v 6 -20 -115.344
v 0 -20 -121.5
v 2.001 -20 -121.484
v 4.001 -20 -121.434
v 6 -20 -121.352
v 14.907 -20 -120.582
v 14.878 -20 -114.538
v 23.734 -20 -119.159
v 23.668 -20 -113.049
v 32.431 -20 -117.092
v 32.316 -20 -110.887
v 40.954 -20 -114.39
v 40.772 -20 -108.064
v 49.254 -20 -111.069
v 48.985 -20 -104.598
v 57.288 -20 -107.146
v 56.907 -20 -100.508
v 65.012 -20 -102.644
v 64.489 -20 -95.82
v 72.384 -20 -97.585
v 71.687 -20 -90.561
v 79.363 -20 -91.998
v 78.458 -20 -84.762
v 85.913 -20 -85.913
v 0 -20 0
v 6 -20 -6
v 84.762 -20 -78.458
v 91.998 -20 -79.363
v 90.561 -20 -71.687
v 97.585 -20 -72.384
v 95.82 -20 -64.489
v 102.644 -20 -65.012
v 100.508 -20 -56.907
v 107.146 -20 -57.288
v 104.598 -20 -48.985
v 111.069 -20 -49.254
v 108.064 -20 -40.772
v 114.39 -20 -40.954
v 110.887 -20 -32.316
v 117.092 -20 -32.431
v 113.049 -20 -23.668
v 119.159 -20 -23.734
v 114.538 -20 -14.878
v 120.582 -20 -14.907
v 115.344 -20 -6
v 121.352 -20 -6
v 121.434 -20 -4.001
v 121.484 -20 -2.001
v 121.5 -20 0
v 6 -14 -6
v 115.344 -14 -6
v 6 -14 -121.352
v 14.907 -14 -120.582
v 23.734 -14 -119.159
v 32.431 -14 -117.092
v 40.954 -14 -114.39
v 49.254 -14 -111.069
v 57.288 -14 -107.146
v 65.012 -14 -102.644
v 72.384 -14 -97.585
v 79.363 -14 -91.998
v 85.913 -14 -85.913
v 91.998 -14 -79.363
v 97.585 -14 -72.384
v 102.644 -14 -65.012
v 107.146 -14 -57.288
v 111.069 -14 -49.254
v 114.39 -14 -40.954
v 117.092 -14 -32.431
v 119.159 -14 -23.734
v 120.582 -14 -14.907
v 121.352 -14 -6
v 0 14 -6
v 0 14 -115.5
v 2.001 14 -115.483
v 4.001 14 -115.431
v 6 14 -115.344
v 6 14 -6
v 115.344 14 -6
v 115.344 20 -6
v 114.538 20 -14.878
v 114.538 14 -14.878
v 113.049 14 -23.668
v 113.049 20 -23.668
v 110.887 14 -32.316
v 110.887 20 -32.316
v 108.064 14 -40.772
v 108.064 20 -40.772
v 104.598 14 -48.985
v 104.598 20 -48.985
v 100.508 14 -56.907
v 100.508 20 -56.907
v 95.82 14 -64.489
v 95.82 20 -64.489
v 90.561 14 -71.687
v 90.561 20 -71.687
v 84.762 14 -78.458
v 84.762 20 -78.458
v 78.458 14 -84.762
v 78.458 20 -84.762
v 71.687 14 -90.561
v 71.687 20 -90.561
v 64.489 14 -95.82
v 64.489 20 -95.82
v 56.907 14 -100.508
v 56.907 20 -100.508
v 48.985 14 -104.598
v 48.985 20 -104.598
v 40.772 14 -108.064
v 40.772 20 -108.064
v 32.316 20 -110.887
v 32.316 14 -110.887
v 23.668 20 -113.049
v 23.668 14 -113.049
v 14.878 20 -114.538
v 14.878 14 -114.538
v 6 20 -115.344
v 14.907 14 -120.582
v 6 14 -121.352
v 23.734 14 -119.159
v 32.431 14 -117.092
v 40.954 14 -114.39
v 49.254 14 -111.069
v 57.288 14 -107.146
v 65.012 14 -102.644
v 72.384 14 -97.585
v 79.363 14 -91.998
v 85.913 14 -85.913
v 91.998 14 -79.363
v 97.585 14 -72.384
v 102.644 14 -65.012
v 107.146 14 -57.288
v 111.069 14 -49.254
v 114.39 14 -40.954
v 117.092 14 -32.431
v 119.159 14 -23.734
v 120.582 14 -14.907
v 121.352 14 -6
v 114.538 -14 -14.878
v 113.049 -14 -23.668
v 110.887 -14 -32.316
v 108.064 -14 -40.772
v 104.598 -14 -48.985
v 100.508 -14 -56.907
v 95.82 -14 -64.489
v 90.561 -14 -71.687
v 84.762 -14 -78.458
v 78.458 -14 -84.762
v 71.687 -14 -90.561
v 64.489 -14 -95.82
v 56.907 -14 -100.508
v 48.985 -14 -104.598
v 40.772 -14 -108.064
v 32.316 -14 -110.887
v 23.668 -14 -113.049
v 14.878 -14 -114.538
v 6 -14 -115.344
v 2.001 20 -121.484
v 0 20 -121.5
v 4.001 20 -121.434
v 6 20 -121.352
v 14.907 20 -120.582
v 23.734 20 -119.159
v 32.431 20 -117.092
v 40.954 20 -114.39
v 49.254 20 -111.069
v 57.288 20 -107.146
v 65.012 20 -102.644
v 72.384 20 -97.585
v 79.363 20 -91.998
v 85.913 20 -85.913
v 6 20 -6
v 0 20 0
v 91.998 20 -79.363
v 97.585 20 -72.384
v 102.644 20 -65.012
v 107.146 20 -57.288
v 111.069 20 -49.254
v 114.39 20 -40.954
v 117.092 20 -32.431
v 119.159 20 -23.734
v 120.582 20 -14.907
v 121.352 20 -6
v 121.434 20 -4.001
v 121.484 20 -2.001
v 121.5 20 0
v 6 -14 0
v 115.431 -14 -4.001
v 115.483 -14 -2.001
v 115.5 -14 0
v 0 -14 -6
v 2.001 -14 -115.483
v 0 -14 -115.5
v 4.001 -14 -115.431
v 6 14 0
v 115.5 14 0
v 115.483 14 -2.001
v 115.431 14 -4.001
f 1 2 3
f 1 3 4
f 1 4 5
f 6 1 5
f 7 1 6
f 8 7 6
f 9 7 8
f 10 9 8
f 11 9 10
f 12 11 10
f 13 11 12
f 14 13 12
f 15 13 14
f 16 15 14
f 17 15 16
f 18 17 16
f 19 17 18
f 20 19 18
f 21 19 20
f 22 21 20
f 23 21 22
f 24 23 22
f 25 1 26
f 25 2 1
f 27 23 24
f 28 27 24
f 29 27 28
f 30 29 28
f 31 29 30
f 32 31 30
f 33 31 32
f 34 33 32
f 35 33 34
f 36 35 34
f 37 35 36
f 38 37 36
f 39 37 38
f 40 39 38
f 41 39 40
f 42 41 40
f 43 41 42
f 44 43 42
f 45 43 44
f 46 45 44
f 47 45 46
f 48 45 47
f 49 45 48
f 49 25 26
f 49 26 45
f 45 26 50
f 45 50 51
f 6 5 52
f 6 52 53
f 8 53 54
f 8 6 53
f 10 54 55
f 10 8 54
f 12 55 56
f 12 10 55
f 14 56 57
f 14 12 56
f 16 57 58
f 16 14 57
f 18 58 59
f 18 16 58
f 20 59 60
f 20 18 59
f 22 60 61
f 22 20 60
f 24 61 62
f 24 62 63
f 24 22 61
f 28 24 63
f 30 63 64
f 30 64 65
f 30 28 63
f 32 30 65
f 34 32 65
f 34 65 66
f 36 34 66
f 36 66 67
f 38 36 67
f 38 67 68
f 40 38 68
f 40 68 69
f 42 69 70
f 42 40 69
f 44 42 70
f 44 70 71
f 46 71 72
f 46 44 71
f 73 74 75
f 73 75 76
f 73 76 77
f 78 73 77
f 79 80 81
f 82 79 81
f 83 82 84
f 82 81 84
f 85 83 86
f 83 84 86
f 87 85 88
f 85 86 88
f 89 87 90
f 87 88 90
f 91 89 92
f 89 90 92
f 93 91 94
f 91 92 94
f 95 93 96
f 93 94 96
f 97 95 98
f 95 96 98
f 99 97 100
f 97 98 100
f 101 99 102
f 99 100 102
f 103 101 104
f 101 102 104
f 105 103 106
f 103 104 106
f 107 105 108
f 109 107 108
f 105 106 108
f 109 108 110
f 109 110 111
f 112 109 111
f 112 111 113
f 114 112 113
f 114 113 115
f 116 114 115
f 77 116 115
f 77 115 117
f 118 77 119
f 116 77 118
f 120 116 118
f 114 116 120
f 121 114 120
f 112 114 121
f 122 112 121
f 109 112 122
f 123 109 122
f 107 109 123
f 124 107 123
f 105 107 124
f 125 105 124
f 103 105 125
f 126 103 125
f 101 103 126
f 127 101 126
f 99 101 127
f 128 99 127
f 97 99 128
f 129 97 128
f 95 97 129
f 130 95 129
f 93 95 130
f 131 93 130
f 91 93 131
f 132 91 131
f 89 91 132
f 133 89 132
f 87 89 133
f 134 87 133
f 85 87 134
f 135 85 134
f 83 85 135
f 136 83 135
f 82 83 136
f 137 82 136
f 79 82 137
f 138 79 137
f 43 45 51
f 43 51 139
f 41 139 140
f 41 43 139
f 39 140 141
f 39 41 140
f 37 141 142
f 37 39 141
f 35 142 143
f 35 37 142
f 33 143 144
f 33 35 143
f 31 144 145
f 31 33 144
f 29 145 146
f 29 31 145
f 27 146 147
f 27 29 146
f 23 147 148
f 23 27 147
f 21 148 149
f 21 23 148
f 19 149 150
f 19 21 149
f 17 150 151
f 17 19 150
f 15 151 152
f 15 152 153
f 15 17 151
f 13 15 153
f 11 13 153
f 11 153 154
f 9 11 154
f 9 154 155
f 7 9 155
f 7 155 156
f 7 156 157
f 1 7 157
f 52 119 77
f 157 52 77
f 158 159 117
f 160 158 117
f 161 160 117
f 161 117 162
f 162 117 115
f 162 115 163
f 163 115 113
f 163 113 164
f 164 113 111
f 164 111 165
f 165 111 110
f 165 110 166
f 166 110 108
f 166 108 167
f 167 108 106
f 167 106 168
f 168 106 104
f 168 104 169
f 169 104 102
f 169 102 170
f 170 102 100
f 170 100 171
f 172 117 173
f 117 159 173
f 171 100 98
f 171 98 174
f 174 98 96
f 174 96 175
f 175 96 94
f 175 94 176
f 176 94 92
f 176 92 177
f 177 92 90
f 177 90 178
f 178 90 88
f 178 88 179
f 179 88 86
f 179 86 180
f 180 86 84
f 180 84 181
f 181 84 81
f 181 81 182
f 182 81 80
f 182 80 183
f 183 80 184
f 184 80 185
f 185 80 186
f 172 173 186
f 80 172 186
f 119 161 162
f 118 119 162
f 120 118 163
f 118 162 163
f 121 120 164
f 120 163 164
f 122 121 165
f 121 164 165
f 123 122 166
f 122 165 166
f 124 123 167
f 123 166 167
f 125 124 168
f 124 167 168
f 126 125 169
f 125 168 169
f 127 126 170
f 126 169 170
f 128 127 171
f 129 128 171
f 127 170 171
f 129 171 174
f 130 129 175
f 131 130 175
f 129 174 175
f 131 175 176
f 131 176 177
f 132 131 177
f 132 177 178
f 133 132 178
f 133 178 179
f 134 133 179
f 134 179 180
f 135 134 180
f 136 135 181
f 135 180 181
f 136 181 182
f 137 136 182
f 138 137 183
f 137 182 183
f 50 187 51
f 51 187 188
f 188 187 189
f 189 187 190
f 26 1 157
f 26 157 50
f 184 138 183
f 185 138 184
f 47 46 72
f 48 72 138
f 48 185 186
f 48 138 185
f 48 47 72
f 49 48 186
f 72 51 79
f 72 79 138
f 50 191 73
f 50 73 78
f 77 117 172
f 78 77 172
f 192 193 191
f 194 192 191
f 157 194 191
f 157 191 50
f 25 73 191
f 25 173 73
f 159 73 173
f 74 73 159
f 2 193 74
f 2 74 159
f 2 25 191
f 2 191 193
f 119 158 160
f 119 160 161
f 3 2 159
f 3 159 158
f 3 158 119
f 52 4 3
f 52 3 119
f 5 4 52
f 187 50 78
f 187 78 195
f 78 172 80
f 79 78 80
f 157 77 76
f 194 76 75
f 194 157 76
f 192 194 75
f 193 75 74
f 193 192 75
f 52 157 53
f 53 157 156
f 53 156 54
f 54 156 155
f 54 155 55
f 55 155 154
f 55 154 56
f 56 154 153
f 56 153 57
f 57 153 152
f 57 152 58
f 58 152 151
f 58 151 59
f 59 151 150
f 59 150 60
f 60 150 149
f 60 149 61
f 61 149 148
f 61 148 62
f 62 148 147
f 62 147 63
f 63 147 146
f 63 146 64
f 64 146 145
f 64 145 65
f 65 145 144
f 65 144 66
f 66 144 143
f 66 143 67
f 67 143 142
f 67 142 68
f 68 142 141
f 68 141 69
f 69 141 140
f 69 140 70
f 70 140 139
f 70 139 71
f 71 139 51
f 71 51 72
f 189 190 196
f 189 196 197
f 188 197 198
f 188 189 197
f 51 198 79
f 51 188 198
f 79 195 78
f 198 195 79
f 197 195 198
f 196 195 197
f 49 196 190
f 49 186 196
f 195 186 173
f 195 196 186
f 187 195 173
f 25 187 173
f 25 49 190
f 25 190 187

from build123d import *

# Parameters (mm, degrees)
F0_W     = 6
F0_H     = 6
F1_DEPTH = 26
F2_DEPTH = 6


with BuildPart() as f1:
    # F0 (on Front) → F1 (new body)
    with BuildSketch(Plane.XZ):
        with Locations((3, -3)):
            Rectangle(F0_W, F0_H)
    extrude(amount=F1_DEPTH)



with BuildPart() as f1b:
    # F0 (on Front) → F1, piece 2 (new body)
    with BuildSketch(Plane.XZ):
        with BuildLine():
            Line((120, -6), (121.3517614211, -6))
            ThreePointArc((121.3517614211, -6), (121.4629347016, -3.0009154718), (121.5, 0))
            Line((121.5, 0), (115.5, 0))
            ThreePointArc((115.5, 0), (115.4610060581, -3.0010131717), (115.3440505618, -6))
            Line((115.3440505618, -6), (120, -6))
        make_face()
    extrude(amount=F1_DEPTH)


with BuildPart() as f1c:
    # F0 (on Front) → F1, piece 3 (new body)
    with BuildSketch(Plane.XZ):
        with BuildLine():
            Line((0, -115.5), (0, -121.5))
            ThreePointArc((0, -121.5), (3.0009154718, -121.4629347016), (6, -121.3517614211))
            Line((6, -121.3517614211), (6, -120))
            Line((6, -120), (6, -115.3440505618))
            ThreePointArc((6, -115.3440505618), (3.0010131717, -115.4610060581), (0, -115.5))
        make_face()
    extrude(amount=F1_DEPTH)


with BuildPart() as f1_1:
    add(f1.part)

    add(f1b.part)  # F2 merges F1b

    add(f1c.part)  # F2 merges F1c
    # F0 (on Front) → F2 (join)
    with BuildSketch(Plane.XZ):
        with BuildLine():
            Line((6, 0), (6, -6))
            Line((6, -6), (115.3440505618, -6))
            ThreePointArc((115.3440505618, -6), (115.4610060581, -3.0010131717), (115.5, 0))
            Line((115.5, 0), (6, 0))
        make_face()
        with BuildLine():
            Line((6, -120), (6, -121.3517614211))
            ThreePointArc((6, -121.3517614211), (85.9134739142, -85.9134739142), (121.3517614211, -6))
            Line((121.3517614211, -6), (120, -6))
            Line((120, -6), (115.3440505618, -6))
            ThreePointArc((115.3440505618, -6), (81.670833227, -81.670833227), (6, -115.3440505618))
            Line((6, -115.3440505618), (6, -120))
        make_face()
        with BuildLine():
            Line((0, -6), (0, -115.5))
            ThreePointArc((0, -115.5), (3.0010131717, -115.4610060581), (6, -115.3440505618))
            Line((6, -115.3440505618), (6, -6))
            Line((6, -6), (0, -6))
        make_face()
    extrude(amount=F2_DEPTH)


with BuildPart() as f1_2:
    # F3: moved
    add(f1_1.part.moved(Location((0, 20, 0))))

    # F4: F1 across plane


with BuildPart() as f1_3:
    add(f1_2.part)
    add(f1_2.part.mirror(Plane.XZ))


solid = f1_3.part
